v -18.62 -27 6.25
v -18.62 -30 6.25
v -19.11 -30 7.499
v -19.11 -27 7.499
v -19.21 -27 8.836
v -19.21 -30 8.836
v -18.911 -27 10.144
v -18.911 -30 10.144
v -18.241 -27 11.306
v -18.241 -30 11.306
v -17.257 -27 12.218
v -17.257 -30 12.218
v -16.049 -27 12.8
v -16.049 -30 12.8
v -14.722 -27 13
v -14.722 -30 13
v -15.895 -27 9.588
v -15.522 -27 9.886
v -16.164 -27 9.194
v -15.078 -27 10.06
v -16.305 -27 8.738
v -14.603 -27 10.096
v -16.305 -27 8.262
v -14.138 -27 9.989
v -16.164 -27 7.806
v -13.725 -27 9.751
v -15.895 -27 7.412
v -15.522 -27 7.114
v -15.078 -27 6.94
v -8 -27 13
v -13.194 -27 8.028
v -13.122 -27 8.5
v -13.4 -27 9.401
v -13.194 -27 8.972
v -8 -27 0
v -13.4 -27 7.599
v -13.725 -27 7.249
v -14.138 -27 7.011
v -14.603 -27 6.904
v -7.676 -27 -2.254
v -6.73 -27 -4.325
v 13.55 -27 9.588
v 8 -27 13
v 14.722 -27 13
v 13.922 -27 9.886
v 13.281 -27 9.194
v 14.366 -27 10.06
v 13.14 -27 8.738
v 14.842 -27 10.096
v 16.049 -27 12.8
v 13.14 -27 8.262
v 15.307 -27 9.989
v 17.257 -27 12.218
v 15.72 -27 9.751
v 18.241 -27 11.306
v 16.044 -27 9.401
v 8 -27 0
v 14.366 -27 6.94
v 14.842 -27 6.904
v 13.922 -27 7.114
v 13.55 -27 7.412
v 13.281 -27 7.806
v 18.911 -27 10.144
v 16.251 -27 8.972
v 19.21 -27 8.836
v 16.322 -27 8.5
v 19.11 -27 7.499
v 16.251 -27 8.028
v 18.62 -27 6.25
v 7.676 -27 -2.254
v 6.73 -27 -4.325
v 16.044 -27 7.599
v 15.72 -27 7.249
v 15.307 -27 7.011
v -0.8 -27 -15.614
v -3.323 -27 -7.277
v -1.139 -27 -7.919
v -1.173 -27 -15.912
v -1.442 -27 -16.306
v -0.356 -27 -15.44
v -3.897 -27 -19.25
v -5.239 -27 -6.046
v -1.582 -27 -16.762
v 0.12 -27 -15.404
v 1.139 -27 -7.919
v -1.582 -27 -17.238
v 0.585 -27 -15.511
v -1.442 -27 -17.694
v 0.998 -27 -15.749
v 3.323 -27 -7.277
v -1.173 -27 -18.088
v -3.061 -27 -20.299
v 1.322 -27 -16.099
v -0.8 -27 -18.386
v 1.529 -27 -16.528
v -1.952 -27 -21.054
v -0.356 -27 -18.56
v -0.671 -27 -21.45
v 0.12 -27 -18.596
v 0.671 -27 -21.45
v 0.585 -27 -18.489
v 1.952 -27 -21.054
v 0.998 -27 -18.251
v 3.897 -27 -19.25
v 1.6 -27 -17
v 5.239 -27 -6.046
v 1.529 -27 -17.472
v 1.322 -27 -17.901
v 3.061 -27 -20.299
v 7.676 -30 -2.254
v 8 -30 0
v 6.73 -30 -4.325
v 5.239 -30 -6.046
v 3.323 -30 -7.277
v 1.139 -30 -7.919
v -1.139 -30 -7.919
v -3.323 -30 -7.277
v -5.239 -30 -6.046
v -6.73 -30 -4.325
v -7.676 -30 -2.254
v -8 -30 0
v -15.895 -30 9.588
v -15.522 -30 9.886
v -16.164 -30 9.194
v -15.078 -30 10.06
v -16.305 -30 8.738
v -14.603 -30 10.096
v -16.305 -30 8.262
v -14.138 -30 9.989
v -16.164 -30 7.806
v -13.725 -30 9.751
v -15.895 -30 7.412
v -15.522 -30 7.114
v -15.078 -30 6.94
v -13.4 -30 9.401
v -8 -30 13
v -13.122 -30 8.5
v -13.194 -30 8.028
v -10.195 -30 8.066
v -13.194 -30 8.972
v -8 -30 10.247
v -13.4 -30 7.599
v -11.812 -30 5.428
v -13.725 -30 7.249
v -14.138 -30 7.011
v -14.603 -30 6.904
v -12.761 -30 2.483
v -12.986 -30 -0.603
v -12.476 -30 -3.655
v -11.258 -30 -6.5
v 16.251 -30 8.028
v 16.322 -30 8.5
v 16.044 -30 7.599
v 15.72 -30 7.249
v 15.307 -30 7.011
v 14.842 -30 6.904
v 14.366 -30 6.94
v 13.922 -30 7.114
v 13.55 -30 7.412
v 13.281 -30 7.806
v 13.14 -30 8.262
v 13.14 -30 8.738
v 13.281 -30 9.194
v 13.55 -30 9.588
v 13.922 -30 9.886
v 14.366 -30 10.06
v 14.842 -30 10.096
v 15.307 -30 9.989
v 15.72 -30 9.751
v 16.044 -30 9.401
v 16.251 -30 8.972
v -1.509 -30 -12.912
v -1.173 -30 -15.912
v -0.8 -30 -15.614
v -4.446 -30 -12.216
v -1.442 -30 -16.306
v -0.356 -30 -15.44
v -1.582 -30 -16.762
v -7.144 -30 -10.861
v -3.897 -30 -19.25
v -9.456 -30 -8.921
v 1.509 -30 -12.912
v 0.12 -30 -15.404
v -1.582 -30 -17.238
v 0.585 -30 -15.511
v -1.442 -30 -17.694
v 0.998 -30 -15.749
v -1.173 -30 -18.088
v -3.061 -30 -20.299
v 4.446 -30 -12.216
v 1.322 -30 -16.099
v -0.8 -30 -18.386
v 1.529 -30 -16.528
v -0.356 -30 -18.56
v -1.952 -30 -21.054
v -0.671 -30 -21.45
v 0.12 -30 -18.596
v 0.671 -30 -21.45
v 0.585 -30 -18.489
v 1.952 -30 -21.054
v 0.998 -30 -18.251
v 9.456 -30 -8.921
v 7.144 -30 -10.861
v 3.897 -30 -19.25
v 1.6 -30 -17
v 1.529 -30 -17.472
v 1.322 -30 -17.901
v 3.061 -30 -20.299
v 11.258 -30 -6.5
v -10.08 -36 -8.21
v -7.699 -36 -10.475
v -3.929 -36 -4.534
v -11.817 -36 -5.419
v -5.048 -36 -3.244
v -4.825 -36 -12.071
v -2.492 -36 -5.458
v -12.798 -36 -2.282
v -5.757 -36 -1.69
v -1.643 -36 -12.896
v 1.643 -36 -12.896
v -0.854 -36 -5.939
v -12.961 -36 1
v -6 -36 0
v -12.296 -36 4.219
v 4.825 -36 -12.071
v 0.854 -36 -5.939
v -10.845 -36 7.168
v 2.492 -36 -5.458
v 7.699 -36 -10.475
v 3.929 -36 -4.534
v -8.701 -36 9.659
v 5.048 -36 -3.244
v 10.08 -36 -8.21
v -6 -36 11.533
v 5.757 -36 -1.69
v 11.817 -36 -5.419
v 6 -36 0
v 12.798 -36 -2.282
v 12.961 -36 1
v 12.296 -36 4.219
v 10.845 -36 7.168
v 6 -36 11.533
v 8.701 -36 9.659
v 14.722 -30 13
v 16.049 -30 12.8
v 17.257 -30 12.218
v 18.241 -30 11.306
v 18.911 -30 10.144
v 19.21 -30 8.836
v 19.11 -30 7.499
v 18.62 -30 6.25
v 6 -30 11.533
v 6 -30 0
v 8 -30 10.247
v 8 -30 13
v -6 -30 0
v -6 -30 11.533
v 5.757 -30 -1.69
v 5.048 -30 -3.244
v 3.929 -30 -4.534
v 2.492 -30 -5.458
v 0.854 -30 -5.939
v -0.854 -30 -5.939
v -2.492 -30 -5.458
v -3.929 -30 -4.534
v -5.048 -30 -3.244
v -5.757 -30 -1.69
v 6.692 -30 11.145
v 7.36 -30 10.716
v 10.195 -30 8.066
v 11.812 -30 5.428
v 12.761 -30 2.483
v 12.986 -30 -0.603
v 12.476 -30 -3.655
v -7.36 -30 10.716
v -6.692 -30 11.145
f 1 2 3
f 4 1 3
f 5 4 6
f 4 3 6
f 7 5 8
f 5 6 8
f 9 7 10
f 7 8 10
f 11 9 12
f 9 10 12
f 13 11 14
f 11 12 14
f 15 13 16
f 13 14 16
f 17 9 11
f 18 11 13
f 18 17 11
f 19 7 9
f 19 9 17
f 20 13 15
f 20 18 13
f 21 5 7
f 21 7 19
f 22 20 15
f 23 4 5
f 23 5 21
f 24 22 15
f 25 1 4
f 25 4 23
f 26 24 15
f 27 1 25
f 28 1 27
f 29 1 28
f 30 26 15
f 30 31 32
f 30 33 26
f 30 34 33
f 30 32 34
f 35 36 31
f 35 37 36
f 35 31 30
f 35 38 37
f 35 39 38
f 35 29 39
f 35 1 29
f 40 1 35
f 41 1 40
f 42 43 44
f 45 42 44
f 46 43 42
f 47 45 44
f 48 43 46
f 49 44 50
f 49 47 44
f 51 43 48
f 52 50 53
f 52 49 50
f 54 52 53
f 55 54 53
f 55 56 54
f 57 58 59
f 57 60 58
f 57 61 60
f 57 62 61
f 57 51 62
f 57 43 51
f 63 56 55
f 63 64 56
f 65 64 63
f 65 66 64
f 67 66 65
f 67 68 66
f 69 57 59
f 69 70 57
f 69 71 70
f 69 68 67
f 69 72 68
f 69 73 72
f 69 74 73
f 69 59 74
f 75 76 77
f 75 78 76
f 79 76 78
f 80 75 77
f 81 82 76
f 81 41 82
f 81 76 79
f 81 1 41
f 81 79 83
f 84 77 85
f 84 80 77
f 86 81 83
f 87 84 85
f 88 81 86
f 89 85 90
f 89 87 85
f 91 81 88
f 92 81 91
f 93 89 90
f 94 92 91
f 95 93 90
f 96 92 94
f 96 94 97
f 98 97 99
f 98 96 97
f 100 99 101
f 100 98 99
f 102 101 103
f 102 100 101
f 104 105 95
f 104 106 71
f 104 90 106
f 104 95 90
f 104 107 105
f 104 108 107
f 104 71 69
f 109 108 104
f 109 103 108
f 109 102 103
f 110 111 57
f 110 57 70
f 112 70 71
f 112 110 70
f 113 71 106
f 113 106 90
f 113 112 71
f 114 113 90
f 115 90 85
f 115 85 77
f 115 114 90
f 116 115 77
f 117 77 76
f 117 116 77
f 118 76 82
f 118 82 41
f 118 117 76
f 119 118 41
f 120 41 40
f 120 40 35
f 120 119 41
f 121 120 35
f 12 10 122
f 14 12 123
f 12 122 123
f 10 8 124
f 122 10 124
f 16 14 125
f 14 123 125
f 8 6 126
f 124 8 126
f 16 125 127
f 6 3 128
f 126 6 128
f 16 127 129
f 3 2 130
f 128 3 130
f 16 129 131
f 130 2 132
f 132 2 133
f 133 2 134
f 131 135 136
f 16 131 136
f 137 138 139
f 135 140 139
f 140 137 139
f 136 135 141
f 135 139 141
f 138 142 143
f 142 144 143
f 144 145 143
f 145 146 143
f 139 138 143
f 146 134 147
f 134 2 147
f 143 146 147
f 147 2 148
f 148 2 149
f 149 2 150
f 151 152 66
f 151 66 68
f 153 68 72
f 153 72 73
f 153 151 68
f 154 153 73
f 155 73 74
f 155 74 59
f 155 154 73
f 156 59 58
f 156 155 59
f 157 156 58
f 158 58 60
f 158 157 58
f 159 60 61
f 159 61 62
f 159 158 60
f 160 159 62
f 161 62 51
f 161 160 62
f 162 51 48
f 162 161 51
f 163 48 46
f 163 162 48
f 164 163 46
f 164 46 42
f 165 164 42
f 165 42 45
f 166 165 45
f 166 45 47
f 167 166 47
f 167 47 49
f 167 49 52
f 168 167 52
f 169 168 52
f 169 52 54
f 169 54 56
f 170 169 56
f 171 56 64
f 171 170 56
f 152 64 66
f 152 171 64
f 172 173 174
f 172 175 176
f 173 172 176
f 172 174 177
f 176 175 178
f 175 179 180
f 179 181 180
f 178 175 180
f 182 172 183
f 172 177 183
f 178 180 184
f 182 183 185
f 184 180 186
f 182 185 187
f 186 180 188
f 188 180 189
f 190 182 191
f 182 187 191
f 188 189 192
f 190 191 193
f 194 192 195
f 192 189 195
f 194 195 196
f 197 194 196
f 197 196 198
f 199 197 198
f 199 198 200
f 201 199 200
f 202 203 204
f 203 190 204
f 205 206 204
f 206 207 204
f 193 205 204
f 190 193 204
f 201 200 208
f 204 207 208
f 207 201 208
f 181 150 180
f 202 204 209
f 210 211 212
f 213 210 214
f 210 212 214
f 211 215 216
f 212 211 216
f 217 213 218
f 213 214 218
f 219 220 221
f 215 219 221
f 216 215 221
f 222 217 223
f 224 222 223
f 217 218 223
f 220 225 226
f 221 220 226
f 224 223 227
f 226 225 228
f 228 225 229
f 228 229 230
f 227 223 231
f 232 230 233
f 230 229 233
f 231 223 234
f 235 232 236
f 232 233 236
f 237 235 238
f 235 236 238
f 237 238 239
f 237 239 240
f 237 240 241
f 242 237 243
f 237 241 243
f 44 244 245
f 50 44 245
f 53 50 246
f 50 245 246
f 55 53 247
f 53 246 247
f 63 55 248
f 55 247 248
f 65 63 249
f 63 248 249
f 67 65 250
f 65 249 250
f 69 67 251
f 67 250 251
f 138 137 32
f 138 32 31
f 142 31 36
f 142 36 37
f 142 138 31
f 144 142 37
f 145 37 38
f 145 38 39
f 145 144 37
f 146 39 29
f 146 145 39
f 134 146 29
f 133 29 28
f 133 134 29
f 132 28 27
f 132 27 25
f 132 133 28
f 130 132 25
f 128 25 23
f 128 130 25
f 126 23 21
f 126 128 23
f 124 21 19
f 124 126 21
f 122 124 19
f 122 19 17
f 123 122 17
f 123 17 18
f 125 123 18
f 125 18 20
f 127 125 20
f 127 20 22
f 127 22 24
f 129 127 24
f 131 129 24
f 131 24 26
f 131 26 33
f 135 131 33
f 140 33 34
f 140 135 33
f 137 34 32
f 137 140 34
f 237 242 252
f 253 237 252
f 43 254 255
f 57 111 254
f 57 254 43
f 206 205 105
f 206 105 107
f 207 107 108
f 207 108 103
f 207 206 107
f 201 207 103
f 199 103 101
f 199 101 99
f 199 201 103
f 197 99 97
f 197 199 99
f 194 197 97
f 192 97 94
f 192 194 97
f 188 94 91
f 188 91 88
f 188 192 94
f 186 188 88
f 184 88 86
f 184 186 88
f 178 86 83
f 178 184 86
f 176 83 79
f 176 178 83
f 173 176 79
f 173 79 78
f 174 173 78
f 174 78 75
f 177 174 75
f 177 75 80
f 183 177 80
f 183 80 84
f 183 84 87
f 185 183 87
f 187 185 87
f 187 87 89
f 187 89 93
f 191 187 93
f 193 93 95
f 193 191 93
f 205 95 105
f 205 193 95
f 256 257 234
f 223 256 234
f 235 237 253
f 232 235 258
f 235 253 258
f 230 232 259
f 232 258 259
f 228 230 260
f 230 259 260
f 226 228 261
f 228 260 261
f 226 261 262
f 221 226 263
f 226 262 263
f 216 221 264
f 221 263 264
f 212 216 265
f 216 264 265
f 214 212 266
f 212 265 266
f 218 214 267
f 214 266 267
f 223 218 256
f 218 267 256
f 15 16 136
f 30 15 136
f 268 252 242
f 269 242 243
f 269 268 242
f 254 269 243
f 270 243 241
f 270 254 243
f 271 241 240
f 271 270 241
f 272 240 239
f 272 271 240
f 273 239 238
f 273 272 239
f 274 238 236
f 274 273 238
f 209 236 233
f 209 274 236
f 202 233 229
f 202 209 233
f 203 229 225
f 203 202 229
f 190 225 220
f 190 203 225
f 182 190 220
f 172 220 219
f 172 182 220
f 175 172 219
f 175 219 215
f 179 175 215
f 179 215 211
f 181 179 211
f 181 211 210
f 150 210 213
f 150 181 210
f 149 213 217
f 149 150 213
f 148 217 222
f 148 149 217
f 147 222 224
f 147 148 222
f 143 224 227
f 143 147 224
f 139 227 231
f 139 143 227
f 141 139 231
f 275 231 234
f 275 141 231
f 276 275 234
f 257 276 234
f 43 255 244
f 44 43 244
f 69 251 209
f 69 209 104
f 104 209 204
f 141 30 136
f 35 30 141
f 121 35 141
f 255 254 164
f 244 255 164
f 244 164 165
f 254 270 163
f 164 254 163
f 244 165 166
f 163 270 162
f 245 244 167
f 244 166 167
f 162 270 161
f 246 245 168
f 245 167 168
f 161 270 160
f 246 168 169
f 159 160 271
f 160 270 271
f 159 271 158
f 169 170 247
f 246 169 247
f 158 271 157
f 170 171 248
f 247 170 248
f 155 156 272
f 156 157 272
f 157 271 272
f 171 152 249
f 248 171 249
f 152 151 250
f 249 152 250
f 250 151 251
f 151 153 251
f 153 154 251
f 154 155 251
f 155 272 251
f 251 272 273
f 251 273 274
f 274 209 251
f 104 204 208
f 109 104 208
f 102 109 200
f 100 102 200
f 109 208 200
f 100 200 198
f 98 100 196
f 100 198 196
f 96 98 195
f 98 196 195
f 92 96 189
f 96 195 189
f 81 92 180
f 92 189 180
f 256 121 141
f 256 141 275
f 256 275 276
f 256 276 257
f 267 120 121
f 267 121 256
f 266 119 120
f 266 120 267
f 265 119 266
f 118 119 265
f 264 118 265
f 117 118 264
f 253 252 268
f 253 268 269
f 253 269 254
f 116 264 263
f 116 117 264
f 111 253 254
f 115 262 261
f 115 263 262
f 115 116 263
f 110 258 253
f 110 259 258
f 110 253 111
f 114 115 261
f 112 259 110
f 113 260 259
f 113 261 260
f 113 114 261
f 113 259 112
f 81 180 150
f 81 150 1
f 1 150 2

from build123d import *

# Parameters (mm, degrees)
SKETCH_1_R          = 13
SKETCH_1_R_2        = 6
EXTRUDE_1_DEPTH     = 6
SKETCH_2_R          = 8
EXTRUDE_2_DEPTH     = 3
CUT_EXTRUDE_1_DEPTH = 47.127561032
OTHER_START         = -30
OTHER_1_OUTLINE_R   = 1.6
OTHER_1_DEPTH       = 3


# Read off the part's stored shape, not the designer's step: 高级异型孔1
with BuildPart() as part:
    # 草图1 → 凸台-拉伸1 (new body)
    with BuildSketch(Plane(origin=(0, -30, 0), x_dir=(1, 0, 0), z_dir=(0, 1, 0))):
        with Locations(Location((0, 0, 0), (0, 0, 270))):
            Circle(SKETCH_1_R)
        with Locations(Location((0, 0, 0), (0, 0, 270))):
            Circle(SKETCH_1_R_2, mode=Mode.SUBTRACT)
    extrude(amount=-EXTRUDE_1_DEPTH)

    # 草图2 → 凸台-拉伸2 (add)
    with BuildSketch(Plane(origin=(0, -30, 0), x_dir=(1, 0, 0), z_dir=(0, 1, 0))):
        with BuildLine():
            Line((-3.897114317, 19.25), (-18.619546181, -6.25))
            ThreePointArc((-18.619546181, -6.25), (-18.619546181, -10.75), (-14.722431864, -13))
            Line((-14.722431864, -13), (14.722431864, -13))
            ThreePointArc((14.722431864, -13), (18.619546181, -10.75), (18.619546181, -6.25))
            Line((18.619546181, -6.25), (3.897114317, 19.25))
            ThreePointArc((3.897114317, 19.25), (0, 21.5), (-3.897114317, 19.25))
        make_face()
        with Locations(Location((0, 0, 0), (0, 0, 270))):
            Circle(SKETCH_2_R, mode=Mode.SUBTRACT)
    extrude(amount=EXTRUDE_2_DEPTH)

    # 草图3 → 切除-拉伸1 (cut, through all)
    with BuildSketch(Plane.XY):
        Polygon((-8, -27), (-8, -30), (-6, -30), (-6, -36.276321086), (6, -36.276321086), (6, -30), (8, -30), (8, -27), align=None)
    extrude(amount=CUT_EXTRUDE_1_DEPTH, mode=Mode.SUBTRACT)

    # 高级异型孔1 outline → 高级异型孔1 (cut)
    with BuildSketch(Plane(origin=(0, 0, 0), x_dir=(1, 0, 0), z_dir=(0, 1, 0)).offset(OTHER_START)):
        with Locations((-14.722431864, -8.5)):
            Circle(OTHER_1_OUTLINE_R)
        with Locations((14.722431864, -8.5)):
            Circle(OTHER_1_OUTLINE_R)
        with Locations((0, 17)):
            Circle(OTHER_1_OUTLINE_R)
    extrude(amount=OTHER_1_DEPTH, mode=Mode.SUBTRACT)


solid = part.part
